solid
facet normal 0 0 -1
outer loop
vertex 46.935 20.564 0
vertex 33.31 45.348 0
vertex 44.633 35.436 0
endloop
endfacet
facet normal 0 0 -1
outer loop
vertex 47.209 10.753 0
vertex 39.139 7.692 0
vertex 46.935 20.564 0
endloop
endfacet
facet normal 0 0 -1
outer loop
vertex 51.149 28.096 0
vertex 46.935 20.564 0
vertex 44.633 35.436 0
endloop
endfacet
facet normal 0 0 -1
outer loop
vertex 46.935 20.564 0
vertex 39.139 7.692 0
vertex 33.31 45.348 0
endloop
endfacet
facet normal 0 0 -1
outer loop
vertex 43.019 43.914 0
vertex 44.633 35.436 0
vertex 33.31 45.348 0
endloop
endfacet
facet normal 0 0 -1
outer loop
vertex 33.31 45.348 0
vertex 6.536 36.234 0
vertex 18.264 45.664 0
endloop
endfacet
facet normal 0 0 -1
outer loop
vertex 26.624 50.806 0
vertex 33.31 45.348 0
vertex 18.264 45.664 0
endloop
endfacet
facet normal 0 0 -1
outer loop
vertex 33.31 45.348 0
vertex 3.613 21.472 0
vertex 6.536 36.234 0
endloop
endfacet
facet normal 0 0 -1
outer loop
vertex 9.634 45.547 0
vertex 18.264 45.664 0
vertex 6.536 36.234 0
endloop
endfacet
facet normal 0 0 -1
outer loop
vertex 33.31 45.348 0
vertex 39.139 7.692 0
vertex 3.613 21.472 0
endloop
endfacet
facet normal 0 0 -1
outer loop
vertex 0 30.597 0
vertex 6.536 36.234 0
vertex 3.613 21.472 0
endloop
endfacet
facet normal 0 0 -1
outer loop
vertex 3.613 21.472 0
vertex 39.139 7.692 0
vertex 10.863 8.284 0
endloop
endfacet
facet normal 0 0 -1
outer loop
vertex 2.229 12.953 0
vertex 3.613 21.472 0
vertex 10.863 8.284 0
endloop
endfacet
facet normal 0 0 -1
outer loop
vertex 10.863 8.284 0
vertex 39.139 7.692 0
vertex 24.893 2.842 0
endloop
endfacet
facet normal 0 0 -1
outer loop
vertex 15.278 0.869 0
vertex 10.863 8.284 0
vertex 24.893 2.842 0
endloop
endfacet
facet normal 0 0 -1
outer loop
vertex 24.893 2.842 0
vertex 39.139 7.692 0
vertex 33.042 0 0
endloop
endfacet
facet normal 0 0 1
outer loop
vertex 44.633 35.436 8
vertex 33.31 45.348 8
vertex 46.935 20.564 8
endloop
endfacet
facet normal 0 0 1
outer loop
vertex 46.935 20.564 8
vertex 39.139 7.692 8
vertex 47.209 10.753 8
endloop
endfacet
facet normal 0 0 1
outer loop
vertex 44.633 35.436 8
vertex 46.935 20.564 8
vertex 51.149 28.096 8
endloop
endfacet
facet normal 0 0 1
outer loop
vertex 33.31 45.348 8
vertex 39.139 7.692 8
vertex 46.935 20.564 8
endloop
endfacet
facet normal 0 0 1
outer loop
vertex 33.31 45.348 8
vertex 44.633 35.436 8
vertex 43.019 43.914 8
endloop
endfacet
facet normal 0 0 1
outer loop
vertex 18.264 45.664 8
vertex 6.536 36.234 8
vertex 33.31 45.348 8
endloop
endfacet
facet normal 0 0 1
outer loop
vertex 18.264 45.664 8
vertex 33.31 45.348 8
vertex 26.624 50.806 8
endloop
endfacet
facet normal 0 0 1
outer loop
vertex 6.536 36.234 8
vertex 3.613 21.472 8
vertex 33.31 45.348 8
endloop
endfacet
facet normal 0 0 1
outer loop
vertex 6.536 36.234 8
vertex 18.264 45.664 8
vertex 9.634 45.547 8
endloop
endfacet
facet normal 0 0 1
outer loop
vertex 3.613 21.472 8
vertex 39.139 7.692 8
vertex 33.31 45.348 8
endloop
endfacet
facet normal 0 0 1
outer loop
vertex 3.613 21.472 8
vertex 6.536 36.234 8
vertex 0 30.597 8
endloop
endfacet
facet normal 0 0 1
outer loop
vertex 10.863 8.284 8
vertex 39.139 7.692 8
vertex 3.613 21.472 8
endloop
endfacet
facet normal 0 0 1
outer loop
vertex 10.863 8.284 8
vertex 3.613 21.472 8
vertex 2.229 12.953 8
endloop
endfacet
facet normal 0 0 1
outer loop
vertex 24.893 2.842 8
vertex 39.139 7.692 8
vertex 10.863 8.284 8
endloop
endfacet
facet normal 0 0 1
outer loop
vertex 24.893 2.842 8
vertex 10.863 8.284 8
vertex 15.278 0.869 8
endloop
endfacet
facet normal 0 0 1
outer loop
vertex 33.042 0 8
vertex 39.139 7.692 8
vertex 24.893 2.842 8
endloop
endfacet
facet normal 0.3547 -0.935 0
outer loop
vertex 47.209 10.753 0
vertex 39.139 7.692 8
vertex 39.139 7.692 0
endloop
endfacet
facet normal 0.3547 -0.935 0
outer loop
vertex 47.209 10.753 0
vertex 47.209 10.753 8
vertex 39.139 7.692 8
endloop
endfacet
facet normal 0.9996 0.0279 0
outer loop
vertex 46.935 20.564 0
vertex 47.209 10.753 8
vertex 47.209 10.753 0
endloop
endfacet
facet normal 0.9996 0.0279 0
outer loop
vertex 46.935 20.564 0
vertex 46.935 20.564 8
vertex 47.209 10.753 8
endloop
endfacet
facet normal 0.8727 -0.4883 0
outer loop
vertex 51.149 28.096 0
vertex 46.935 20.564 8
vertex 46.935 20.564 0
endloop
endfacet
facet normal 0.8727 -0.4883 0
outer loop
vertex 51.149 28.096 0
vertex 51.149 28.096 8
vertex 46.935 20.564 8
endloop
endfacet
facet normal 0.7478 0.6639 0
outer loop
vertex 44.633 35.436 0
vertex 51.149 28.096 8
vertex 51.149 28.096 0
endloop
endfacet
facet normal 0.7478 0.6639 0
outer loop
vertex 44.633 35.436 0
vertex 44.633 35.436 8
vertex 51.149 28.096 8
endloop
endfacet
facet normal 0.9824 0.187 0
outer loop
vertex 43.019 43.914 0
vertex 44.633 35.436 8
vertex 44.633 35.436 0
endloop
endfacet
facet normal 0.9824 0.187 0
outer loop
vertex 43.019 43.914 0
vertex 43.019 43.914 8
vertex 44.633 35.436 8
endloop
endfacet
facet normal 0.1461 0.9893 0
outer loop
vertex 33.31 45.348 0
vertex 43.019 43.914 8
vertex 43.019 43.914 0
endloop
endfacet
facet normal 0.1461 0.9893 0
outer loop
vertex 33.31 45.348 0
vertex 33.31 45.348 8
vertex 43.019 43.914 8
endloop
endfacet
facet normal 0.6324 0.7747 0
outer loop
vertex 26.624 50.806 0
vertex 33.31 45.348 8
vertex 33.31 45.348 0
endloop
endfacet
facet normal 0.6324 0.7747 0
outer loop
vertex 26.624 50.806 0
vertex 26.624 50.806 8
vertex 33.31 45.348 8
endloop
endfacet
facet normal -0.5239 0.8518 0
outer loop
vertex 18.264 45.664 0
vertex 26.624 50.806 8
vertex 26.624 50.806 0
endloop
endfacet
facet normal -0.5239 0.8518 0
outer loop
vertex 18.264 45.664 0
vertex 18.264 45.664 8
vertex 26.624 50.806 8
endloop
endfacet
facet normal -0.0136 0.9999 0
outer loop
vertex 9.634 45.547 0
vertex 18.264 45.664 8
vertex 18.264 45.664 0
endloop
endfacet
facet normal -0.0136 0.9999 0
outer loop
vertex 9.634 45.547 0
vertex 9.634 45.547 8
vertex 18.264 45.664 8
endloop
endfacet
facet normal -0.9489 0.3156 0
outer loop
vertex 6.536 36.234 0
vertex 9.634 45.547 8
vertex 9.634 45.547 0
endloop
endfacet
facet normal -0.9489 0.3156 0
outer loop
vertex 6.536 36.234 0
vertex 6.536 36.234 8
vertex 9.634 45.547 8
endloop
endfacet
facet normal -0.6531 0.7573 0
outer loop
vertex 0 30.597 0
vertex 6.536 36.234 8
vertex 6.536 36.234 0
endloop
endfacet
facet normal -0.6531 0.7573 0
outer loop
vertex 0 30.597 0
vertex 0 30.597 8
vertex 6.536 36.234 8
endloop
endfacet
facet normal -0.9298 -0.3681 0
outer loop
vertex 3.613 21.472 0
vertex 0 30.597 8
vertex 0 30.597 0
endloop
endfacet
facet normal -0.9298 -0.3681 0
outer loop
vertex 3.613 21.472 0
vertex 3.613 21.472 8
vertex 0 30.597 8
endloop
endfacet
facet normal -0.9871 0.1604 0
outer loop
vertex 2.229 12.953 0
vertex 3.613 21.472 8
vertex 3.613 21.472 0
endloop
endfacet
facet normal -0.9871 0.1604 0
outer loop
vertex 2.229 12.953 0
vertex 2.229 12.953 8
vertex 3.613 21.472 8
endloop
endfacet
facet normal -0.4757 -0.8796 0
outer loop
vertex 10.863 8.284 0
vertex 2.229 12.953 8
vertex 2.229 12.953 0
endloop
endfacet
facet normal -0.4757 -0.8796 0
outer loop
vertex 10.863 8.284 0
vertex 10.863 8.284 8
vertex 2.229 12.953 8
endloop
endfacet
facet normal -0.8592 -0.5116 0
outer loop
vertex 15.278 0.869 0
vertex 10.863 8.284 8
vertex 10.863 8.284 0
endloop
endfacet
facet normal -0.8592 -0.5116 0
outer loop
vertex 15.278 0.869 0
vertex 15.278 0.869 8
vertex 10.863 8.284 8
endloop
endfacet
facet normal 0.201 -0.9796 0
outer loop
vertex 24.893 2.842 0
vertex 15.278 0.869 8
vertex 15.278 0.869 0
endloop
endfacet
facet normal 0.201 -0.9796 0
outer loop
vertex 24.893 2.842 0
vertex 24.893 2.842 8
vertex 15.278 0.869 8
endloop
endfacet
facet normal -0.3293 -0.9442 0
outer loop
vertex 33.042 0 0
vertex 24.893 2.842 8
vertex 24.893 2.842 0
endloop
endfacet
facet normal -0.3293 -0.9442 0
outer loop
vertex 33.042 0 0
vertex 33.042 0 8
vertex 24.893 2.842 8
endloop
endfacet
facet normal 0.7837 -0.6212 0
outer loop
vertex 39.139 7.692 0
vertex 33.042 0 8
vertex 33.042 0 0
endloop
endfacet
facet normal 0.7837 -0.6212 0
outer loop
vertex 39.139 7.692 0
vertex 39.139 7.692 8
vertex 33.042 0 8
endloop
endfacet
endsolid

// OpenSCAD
$fn = 32;

// ----------------------------------------------------------------------
// Chain sprocket: 9 teeth, 22 mm root radius
// ----------------------------------------------------------------------

// --- parameters (mm) ---
profile_height = 8;       // extrusion height
profile_points = 18;      // points of the closed outline

profile = [[46.935, 20.564], [51.149, 28.096], [44.633, 35.436], [43.019, 43.914], [33.31, 45.348], [26.624, 50.806], [18.264, 45.664], [9.634, 45.547], [6.536, 36.234], [0, 30.597], [3.613, 21.472], [2.229, 12.953], [10.863, 8.284], [15.278, 0.869], [24.893, 2.842], [33.042, 0], [39.139, 7.692], [47.209, 10.753]];  // single closed polygon, 18 points, counter clockwise

// --- the one profile operation ---
linear_extrude(height = profile_height) polygon(points = profile);
